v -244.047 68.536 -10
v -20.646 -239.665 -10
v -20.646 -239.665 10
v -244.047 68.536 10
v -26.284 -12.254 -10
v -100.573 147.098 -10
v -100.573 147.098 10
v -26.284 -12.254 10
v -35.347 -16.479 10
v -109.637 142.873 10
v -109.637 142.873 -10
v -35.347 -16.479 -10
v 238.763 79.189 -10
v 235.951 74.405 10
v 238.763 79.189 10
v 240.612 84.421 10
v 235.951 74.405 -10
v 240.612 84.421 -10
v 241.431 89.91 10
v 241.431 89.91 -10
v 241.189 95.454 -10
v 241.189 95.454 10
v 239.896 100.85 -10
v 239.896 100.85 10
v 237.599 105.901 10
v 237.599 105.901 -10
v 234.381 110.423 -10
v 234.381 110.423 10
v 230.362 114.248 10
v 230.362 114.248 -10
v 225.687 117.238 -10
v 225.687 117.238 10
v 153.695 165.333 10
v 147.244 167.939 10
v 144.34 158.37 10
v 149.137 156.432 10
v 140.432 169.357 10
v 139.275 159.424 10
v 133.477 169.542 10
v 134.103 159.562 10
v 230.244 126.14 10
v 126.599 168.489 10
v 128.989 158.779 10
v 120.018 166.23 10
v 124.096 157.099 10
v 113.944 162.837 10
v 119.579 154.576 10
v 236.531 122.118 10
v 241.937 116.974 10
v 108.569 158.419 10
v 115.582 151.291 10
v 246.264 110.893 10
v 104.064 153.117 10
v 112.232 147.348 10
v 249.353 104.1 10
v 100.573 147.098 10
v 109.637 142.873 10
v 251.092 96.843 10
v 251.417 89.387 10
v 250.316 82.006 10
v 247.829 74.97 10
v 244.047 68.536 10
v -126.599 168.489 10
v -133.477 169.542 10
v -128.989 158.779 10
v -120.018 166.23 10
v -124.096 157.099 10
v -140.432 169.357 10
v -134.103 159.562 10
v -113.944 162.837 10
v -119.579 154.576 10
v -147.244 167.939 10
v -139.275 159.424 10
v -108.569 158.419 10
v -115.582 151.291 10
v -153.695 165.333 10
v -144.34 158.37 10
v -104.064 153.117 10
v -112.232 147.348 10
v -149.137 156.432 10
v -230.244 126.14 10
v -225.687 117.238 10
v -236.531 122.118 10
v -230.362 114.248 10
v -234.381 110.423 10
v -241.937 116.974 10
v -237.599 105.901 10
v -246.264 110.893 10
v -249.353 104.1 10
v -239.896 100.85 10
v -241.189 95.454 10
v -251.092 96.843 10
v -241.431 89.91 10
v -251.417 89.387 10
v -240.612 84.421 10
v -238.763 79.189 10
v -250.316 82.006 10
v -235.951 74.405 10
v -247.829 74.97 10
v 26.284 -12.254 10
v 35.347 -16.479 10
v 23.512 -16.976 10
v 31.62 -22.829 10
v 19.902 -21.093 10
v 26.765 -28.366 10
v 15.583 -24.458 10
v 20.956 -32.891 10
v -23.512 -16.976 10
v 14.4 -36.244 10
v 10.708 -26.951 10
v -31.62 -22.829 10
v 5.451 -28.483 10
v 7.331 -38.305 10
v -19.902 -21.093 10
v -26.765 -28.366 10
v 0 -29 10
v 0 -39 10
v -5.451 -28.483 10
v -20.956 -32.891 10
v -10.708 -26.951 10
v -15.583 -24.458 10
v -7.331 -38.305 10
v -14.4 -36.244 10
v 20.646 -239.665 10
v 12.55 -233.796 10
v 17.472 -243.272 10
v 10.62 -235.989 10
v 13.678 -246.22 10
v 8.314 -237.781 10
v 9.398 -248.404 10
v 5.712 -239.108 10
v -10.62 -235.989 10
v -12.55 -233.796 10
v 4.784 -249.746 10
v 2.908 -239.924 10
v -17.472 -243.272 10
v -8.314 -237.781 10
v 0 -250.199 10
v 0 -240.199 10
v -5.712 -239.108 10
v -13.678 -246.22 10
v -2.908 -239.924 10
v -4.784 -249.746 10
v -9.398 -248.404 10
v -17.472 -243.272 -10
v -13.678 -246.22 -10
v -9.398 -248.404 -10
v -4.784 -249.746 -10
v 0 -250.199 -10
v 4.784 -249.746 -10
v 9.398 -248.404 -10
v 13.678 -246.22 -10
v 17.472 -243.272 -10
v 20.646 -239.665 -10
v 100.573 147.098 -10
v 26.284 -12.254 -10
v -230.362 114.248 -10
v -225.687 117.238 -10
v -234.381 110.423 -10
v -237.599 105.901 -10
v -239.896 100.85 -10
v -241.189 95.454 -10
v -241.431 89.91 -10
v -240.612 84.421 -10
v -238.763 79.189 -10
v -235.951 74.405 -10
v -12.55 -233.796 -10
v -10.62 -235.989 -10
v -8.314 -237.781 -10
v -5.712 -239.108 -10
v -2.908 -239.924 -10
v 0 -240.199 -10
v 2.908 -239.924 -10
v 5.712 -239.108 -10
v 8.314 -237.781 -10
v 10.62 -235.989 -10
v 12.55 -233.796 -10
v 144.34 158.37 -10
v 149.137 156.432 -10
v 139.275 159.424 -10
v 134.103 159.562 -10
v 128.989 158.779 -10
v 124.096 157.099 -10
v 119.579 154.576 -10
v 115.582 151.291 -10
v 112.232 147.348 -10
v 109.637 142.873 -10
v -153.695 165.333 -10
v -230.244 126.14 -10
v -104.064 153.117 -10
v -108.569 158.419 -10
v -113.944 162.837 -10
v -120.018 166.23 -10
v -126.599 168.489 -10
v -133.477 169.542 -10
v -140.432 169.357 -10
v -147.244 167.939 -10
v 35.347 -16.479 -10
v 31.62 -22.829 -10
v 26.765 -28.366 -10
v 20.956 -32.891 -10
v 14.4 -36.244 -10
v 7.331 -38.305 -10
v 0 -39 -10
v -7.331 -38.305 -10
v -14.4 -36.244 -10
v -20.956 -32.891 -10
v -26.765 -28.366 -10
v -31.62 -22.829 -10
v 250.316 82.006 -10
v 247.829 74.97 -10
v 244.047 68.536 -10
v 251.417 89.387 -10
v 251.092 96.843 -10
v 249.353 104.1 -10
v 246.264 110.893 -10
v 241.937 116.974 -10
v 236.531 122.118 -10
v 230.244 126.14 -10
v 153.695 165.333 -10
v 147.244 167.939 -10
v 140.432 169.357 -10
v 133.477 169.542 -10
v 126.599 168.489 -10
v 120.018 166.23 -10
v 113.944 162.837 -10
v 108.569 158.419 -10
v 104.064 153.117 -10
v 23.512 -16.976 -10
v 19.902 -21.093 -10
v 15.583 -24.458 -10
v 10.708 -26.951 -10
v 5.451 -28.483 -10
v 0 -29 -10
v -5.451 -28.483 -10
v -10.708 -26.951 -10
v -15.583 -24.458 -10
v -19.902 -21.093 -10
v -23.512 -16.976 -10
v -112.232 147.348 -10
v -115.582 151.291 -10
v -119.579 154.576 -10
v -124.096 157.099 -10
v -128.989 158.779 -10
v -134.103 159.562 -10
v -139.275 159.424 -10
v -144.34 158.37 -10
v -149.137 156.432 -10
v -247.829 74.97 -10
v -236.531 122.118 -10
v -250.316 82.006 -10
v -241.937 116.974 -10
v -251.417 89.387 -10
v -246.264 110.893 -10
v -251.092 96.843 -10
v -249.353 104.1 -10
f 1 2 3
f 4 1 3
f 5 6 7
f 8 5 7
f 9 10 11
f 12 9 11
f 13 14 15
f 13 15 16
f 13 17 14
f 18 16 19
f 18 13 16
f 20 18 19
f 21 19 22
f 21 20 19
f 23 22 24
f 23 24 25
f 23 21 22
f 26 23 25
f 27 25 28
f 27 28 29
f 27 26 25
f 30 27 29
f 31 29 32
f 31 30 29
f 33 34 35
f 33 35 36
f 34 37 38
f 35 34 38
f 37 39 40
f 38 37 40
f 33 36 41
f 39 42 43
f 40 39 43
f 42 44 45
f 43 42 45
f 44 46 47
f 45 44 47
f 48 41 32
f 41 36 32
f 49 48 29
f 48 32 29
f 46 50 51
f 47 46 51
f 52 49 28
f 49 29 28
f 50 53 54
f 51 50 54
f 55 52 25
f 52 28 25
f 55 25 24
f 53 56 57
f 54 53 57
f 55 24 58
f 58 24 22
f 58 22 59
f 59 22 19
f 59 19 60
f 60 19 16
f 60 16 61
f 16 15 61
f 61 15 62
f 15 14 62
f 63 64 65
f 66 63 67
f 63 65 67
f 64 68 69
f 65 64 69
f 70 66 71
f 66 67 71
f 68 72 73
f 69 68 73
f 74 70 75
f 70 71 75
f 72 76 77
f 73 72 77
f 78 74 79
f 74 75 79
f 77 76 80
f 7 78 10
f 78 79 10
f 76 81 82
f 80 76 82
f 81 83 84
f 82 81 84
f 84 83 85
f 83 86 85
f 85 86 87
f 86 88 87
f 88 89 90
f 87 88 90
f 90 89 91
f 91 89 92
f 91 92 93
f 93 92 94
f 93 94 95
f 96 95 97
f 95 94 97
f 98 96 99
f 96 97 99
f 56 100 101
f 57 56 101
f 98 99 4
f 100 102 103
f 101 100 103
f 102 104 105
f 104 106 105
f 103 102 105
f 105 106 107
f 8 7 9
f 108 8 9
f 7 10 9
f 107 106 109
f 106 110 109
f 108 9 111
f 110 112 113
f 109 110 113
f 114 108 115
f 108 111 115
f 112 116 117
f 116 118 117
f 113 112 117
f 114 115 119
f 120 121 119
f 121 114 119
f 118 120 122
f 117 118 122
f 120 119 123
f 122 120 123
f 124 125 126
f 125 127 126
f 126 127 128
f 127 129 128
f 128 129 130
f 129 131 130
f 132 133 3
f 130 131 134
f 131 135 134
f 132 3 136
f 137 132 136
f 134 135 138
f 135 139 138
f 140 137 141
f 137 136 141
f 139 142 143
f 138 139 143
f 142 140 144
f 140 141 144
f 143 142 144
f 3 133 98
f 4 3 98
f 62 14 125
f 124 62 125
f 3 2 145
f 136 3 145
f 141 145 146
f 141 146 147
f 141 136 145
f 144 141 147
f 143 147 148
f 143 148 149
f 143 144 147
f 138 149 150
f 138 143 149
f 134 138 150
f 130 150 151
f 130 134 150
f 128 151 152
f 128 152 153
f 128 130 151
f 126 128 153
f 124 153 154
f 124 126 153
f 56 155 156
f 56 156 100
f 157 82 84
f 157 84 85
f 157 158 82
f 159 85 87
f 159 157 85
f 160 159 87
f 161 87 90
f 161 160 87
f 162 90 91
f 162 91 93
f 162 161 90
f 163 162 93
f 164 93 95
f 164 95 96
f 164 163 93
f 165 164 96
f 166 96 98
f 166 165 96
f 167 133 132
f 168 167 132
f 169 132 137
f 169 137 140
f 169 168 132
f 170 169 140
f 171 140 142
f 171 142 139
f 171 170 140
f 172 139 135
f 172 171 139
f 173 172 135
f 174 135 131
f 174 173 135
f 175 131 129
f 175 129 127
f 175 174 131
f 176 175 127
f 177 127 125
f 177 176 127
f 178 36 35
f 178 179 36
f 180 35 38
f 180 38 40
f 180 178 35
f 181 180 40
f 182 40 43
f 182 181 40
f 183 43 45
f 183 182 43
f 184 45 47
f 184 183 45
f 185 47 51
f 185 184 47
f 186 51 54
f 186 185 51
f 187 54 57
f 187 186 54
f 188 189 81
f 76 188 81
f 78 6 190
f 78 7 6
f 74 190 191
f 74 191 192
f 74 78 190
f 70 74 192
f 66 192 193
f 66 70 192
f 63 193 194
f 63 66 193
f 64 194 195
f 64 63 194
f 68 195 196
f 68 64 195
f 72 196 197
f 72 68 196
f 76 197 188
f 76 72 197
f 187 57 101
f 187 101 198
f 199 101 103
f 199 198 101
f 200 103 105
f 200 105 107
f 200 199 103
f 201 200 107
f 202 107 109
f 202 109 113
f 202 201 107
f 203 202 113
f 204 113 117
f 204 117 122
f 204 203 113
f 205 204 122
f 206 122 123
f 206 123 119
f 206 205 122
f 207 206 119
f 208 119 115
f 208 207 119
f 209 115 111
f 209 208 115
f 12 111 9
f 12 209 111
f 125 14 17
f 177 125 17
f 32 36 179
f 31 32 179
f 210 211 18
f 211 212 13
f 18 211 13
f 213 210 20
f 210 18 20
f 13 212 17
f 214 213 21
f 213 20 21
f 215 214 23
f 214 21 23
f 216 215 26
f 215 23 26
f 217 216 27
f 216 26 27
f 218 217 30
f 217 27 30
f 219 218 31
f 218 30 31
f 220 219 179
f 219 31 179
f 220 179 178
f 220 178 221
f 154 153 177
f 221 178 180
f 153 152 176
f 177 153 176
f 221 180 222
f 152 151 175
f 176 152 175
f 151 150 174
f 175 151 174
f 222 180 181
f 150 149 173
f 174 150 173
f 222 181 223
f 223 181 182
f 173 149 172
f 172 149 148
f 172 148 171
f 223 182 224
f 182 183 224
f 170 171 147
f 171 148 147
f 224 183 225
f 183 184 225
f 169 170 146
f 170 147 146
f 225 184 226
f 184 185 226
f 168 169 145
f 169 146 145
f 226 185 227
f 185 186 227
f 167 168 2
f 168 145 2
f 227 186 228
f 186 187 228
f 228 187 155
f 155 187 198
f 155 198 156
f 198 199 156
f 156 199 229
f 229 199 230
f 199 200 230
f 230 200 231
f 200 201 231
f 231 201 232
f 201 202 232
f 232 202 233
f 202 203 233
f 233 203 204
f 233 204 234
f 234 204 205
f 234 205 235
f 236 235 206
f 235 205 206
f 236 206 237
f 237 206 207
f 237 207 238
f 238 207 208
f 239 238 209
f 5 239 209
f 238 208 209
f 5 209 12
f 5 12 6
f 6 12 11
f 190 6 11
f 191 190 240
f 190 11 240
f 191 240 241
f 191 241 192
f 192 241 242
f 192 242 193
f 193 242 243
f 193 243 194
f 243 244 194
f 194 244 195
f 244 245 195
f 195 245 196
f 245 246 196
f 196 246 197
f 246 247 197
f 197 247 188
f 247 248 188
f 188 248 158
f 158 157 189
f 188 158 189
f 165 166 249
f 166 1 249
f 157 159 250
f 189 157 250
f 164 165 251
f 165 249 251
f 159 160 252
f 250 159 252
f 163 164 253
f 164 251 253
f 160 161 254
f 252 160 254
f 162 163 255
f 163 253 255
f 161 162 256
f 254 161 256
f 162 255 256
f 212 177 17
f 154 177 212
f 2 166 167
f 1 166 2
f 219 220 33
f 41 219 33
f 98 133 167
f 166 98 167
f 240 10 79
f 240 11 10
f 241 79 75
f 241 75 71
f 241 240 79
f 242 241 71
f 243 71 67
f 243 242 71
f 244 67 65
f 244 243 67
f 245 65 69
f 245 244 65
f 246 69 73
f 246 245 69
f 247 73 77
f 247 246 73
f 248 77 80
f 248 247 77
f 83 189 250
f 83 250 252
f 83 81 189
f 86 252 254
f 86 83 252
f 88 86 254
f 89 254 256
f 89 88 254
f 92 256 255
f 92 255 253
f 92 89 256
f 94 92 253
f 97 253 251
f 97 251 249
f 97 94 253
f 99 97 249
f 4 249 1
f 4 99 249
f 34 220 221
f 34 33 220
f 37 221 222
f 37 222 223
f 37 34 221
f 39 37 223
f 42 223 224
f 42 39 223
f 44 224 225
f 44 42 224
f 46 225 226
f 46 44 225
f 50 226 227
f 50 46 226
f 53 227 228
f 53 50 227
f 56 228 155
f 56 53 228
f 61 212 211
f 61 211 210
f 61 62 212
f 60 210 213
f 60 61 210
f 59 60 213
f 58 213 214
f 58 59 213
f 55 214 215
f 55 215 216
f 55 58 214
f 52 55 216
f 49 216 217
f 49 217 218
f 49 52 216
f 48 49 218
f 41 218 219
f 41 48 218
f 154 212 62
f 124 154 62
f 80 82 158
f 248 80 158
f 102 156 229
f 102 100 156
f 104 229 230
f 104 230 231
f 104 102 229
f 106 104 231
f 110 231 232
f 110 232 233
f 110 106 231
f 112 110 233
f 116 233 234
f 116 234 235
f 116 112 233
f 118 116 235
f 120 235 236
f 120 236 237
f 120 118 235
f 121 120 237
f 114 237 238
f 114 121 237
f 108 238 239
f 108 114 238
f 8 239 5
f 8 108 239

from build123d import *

# Parameters (mm, degrees)
CROQUIS3_W = 20
CROQUIS3_H = 10


with BuildPart() as part:
    # Barrer1: sweep along a path in Croquis2
    with BuildLine(Plane.XY) as barrer1_path:
        Line((-149.137435996, 156.432354984), (-225.686991426, 117.238406938))
        ThreePointArc((-225.686991426, 117.238406938), (-240.672072816, 98.182936179), (-235.950755595, 74.405367047))
        Line((-235.950755595, 74.405367047), (-12.549830507, -233.795760351))
        ThreePointArc((-12.549830507, -233.795760351), (0, -240.19896123), (12.549830507, -233.795760351))
        Line((12.549830507, -233.795760351), (235.950755595, 74.405367047))
        ThreePointArc((235.950755595, 74.405367047), (240.672072816, 98.182936179), (225.686991426, 117.238406938))
        Line((225.686991426, 117.238406938), (149.137435996, 156.432354984))
        ThreePointArc((149.137435996, 156.432354984), (126.505149479, 158.04802573), (109.636839036, 142.872687588))
        Line((109.636839036, 142.872687588), (35.347492768, -16.478918502))
        ThreePointArc((35.347492768, -16.478918502), (0, -39), (-35.347492768, -16.478918502))
        Line((-35.347492768, -16.478918502), (-109.636839036, 142.872687588))
        ThreePointArc((-109.636839036, 142.872687588), (-126.505149479, 158.04802573), (-149.137435996, 156.432354984))
    # Croquis3 → Barrer1 (sweep)
    with BuildSketch(Plane(origin=(0, 0, 0), x_dir=(0, 0, -1), z_dir=(1, 0, 0))):
        with Locations((0, -34)):
            Rectangle(CROQUIS3_W, CROQUIS3_H)
    sweep(path=barrer1_path.line)


solid = part.part
